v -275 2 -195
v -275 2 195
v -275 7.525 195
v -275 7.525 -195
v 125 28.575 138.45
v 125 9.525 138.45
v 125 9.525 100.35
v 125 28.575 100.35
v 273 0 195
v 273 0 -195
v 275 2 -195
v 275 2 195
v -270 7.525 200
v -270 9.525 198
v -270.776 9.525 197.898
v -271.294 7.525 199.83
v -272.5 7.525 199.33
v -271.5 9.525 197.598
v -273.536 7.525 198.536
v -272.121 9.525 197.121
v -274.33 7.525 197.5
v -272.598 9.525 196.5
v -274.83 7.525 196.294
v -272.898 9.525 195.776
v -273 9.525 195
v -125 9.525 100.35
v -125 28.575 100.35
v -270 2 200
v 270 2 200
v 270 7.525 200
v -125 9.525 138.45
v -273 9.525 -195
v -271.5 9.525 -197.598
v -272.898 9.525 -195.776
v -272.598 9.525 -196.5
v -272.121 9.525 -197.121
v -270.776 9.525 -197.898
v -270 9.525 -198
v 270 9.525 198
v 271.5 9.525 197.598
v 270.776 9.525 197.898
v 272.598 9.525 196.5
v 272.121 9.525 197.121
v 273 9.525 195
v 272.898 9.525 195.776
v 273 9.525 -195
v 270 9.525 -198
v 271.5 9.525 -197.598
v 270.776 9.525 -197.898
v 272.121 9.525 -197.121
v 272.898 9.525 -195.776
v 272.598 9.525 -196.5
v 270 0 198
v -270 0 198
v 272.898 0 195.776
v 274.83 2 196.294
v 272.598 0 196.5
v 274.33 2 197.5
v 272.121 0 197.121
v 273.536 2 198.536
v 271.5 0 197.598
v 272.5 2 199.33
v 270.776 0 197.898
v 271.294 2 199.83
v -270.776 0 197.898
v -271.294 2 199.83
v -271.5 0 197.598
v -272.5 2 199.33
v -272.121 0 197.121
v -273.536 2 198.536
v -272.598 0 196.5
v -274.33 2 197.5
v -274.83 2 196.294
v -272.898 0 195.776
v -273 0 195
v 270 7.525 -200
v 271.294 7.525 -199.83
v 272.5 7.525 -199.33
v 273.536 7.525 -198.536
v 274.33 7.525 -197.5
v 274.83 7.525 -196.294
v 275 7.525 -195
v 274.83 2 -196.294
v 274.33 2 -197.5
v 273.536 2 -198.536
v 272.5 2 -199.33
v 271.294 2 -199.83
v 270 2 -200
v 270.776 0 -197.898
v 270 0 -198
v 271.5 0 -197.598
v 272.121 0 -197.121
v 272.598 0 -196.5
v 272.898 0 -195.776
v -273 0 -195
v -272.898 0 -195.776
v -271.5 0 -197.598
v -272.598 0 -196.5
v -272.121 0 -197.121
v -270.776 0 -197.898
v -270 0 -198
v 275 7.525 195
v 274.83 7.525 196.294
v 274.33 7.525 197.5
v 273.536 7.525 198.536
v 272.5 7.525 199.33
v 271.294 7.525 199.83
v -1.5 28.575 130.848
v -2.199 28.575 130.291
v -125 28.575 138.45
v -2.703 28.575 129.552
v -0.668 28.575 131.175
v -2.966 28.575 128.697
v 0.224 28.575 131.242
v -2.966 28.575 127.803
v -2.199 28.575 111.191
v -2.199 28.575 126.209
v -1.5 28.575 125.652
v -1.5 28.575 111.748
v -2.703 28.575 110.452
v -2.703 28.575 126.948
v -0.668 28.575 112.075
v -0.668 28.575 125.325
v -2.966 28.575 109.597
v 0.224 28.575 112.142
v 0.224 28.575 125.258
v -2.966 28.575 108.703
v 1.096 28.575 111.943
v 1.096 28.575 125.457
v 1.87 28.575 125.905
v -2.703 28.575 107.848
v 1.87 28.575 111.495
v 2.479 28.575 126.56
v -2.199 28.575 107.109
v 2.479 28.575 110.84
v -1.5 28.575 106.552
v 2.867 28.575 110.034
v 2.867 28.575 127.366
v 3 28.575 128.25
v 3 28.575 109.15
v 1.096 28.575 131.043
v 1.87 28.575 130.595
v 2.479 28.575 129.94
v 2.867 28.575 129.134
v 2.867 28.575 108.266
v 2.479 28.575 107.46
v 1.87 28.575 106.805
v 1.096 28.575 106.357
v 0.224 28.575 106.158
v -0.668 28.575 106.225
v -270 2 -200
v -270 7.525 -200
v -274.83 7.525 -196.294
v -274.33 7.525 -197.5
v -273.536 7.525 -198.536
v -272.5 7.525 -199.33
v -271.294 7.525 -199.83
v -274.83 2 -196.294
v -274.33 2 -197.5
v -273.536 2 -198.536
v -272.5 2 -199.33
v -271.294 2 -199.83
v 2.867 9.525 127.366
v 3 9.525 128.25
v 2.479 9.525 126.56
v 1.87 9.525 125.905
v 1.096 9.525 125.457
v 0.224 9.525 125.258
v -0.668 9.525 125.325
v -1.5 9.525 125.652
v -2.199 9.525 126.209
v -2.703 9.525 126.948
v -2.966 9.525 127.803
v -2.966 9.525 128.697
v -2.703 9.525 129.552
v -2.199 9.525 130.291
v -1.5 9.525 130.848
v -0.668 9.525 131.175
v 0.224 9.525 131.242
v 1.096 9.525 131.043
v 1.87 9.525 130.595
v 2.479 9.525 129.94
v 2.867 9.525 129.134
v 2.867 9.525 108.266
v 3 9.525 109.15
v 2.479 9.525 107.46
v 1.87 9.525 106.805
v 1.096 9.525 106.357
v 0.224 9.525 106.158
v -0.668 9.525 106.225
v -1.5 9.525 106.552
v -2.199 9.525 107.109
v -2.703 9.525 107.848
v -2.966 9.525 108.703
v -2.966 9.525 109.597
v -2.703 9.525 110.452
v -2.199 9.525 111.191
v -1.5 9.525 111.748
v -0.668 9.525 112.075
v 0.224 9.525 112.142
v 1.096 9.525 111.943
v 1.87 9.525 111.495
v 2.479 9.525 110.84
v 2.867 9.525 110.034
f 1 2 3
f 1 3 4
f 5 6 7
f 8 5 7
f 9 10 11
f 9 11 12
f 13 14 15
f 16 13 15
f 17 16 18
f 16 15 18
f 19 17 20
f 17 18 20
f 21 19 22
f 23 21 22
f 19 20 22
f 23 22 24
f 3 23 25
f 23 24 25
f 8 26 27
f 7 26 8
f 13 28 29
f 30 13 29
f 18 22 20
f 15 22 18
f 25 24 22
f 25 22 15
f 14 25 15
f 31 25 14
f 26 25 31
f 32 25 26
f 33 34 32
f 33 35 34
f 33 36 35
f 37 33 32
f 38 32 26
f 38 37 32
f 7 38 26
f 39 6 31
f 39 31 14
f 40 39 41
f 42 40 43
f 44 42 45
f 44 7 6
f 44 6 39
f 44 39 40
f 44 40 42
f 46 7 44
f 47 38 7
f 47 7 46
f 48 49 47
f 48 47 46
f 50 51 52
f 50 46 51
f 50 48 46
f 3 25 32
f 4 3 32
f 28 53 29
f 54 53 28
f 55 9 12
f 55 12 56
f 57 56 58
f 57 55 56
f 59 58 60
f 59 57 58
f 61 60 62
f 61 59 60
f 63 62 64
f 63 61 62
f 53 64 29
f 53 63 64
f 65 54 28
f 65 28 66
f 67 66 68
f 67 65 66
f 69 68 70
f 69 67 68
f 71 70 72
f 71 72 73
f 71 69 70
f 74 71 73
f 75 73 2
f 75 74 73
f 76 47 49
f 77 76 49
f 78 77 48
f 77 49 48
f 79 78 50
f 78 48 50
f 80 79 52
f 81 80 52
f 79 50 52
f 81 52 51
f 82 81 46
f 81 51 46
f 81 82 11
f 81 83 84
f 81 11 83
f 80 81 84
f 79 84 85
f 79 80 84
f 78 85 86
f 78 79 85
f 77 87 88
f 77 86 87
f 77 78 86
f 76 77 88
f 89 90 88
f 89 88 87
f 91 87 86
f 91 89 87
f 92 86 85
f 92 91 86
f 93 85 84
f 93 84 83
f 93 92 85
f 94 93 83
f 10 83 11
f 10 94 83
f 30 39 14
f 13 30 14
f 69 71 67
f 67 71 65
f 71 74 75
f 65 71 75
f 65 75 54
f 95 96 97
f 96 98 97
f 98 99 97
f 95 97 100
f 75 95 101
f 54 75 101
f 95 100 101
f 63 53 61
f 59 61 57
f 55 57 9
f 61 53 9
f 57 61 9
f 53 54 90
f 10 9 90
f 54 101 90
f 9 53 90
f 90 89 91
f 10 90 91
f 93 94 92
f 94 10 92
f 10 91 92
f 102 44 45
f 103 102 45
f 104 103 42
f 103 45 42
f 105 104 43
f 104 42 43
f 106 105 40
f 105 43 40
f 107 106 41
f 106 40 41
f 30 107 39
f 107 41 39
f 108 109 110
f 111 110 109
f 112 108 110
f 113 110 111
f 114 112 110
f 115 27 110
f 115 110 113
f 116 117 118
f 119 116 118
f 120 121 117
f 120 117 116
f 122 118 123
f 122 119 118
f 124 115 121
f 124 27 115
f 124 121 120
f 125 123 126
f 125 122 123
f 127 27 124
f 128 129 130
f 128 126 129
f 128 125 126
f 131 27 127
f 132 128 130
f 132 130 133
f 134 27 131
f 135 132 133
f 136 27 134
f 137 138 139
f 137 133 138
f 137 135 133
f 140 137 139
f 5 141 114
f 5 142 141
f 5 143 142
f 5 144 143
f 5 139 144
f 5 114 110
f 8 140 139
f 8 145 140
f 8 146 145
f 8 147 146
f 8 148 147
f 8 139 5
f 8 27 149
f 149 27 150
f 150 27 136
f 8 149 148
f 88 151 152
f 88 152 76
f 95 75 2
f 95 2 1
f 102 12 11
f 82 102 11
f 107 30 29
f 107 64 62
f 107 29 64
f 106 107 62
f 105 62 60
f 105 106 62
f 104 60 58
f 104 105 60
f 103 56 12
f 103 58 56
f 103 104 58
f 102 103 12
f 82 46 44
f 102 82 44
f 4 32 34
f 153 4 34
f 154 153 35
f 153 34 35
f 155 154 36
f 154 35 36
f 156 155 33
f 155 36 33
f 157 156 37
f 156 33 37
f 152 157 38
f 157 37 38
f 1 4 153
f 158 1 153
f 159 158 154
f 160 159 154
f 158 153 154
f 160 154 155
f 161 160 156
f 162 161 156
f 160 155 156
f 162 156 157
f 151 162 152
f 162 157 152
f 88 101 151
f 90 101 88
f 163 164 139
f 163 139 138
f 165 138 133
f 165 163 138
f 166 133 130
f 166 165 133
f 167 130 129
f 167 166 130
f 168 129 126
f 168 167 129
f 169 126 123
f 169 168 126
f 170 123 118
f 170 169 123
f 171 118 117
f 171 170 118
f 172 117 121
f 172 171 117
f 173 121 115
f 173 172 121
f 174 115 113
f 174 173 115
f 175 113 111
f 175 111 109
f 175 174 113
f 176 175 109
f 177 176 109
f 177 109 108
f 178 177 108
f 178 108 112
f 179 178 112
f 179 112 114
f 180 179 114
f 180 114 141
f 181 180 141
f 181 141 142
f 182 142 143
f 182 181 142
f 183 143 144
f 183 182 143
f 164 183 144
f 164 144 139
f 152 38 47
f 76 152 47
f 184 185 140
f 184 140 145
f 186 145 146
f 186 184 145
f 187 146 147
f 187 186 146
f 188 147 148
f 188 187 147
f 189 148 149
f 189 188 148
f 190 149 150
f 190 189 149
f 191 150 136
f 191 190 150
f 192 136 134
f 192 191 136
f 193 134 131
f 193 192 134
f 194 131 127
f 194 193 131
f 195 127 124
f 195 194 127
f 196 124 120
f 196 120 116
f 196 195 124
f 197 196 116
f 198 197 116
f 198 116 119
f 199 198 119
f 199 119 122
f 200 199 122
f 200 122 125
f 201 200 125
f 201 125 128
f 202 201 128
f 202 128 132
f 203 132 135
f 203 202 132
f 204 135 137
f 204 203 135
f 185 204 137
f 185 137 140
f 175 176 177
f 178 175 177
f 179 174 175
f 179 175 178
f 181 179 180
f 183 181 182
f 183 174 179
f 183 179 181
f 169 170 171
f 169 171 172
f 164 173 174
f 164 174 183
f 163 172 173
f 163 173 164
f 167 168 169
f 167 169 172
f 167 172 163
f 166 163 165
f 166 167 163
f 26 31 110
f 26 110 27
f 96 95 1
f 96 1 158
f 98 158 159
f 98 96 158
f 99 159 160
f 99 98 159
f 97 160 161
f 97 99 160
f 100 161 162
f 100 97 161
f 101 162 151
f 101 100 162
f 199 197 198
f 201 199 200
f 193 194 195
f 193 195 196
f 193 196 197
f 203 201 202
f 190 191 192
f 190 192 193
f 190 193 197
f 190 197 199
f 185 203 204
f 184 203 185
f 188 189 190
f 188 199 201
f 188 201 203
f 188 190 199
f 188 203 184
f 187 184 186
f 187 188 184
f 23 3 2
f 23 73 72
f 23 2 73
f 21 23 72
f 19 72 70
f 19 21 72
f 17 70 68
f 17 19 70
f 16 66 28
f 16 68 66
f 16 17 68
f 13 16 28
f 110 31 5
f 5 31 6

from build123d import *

# Parameters (mm, degrees)
SKETCH1_W           = 550
SKETCH1_H           = 400
BOSS_EXTRUDE1_DEPTH = 9.525
FILLET2_R           = 5
CHAMFER1_SIZE       = 2
CHAMFER2_SIZE       = 2
SKETCH3_W           = 250
SKETCH3_H           = 38.1
SKETCH3_R           = 3
BOSS_EXTRUDE2_DEPTH = 19.05


with BuildPart() as part:
    # Sketch1 → Boss-Extrude1 (new body)
    with BuildSketch(Plane(origin=(0, 0, 0), x_dir=(1, 0, 0), z_dir=(0, 1, 0))):
        Rectangle(SKETCH1_W, SKETCH1_H)
    extrude(amount=BOSS_EXTRUDE1_DEPTH)

    # Fillet2
    fillet2_edges = [part.edges().sort_by_distance(p)[0] for p in [
        (275, 4.7625, 200),
        (-275, 4.7625, 200),
        (-275, 4.7625, -200),
        (275, 4.7625, -200),
    ]]
    fillet(fillet2_edges, radius=FILLET2_R)

    # Chamfer1
    chamfer1_edges = [part.edges().sort_by_distance(p)[0] for p in [
        (-275, 9.525, 0),
        (0, 9.525, -200),
        (275, 9.525, 0),
        (0, 9.525, 200),
        (-273.535533906, 9.525, 198.535533906),
        (273.535533906, 9.525, 198.535533906),
        (273.535533906, 9.525, -198.535533906),
        (-273.535533906, 9.525, -198.535533906),
    ]]
    chamfer(chamfer1_edges, length=CHAMFER1_SIZE)

    # Chamfer2
    chamfer2_edges = [part.edges().sort_by_distance(p)[0] for p in [
        (-275, 0, 0),
        (275, 0, 0),
        (0, 0, 200),
        (0, 0, -200),
        (-273.535533906, 0, 198.535533906),
        (273.535533906, 0, 198.535533906),
        (273.535533906, 0, -198.535533906),
        (-273.535533906, 0, -198.535533906),
    ]]
    chamfer(chamfer2_edges, length=CHAMFER2_SIZE)

    # Sketch3 → Boss-Extrude2 (add)
    with BuildSketch(Plane(origin=(0, 9.525, 0), x_dir=(1, 0, 0), z_dir=(0, 1, 0))):
        with Locations((0, -119.4)):
            Rectangle(SKETCH3_W, SKETCH3_H)
        with Locations((0, -109.15)):
            Circle(SKETCH3_R, mode=Mode.SUBTRACT)
        with Locations((0, -128.25)):
            Circle(SKETCH3_R, mode=Mode.SUBTRACT)
    extrude(amount=BOSS_EXTRUDE2_DEPTH)


solid = part.part
